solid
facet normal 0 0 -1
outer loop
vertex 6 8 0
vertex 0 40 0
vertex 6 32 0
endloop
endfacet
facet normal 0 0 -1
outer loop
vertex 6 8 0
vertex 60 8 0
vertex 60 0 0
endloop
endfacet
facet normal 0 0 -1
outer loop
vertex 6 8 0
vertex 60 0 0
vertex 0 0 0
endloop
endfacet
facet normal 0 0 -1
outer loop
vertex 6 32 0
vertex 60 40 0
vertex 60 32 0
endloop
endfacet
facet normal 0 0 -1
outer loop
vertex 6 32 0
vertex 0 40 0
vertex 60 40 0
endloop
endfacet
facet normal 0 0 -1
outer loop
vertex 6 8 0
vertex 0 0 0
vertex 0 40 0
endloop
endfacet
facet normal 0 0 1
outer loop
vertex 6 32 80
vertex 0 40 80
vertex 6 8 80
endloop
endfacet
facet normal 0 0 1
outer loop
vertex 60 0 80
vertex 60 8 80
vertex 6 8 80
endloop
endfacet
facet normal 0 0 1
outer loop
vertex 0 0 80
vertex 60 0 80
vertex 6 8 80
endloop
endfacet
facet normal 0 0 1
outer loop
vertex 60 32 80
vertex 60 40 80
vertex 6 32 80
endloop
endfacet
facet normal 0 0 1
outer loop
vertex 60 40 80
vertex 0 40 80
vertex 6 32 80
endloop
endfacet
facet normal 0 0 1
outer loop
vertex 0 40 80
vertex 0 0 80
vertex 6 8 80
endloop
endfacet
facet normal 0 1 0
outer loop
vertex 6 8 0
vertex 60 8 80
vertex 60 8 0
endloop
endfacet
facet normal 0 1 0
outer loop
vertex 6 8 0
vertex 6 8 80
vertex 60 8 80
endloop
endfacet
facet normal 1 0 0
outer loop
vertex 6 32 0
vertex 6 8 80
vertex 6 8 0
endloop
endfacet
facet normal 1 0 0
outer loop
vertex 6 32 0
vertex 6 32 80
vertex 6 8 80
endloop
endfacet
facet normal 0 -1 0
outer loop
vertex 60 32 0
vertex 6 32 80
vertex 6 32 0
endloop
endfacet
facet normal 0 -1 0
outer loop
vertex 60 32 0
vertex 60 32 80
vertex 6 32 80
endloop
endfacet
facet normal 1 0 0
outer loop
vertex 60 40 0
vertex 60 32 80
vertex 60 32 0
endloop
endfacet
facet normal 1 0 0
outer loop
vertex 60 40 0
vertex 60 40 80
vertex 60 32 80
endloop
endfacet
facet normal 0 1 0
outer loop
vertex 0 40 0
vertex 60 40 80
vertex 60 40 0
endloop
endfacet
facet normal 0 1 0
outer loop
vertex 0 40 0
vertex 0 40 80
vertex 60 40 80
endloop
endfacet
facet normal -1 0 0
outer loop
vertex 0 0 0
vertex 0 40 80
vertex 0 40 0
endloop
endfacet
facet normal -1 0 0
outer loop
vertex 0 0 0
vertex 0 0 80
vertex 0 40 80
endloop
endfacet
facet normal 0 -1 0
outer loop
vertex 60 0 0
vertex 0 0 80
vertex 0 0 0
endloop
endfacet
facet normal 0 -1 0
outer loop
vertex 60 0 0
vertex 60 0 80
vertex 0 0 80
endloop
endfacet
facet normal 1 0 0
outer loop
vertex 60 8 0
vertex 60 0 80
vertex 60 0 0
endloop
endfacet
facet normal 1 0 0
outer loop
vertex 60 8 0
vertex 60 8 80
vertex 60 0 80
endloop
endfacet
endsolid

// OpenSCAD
$fn = 32;

// ----------------------------------------------------------------------
// Structural section: channel 60 x 40 mm
// ----------------------------------------------------------------------

// --- parameters (mm) ---
sec_w = 60;               // channel width, X
sec_h = 40;               // channel height, Y
flange_t = 8;             // flange thickness
web_t = 6;                // web thickness
plate_t = 80;             // cut length, Z (extrusion height)

profile = [[0, 0], [60, 0], [60, 8], [6, 8], [6, 32], [60, 32], [60, 40], [0, 40]];  // primary outline, 8 points, counter clockwise

// --- the one profile operation ---
linear_extrude(height = plate_t) polygon(points = profile);
